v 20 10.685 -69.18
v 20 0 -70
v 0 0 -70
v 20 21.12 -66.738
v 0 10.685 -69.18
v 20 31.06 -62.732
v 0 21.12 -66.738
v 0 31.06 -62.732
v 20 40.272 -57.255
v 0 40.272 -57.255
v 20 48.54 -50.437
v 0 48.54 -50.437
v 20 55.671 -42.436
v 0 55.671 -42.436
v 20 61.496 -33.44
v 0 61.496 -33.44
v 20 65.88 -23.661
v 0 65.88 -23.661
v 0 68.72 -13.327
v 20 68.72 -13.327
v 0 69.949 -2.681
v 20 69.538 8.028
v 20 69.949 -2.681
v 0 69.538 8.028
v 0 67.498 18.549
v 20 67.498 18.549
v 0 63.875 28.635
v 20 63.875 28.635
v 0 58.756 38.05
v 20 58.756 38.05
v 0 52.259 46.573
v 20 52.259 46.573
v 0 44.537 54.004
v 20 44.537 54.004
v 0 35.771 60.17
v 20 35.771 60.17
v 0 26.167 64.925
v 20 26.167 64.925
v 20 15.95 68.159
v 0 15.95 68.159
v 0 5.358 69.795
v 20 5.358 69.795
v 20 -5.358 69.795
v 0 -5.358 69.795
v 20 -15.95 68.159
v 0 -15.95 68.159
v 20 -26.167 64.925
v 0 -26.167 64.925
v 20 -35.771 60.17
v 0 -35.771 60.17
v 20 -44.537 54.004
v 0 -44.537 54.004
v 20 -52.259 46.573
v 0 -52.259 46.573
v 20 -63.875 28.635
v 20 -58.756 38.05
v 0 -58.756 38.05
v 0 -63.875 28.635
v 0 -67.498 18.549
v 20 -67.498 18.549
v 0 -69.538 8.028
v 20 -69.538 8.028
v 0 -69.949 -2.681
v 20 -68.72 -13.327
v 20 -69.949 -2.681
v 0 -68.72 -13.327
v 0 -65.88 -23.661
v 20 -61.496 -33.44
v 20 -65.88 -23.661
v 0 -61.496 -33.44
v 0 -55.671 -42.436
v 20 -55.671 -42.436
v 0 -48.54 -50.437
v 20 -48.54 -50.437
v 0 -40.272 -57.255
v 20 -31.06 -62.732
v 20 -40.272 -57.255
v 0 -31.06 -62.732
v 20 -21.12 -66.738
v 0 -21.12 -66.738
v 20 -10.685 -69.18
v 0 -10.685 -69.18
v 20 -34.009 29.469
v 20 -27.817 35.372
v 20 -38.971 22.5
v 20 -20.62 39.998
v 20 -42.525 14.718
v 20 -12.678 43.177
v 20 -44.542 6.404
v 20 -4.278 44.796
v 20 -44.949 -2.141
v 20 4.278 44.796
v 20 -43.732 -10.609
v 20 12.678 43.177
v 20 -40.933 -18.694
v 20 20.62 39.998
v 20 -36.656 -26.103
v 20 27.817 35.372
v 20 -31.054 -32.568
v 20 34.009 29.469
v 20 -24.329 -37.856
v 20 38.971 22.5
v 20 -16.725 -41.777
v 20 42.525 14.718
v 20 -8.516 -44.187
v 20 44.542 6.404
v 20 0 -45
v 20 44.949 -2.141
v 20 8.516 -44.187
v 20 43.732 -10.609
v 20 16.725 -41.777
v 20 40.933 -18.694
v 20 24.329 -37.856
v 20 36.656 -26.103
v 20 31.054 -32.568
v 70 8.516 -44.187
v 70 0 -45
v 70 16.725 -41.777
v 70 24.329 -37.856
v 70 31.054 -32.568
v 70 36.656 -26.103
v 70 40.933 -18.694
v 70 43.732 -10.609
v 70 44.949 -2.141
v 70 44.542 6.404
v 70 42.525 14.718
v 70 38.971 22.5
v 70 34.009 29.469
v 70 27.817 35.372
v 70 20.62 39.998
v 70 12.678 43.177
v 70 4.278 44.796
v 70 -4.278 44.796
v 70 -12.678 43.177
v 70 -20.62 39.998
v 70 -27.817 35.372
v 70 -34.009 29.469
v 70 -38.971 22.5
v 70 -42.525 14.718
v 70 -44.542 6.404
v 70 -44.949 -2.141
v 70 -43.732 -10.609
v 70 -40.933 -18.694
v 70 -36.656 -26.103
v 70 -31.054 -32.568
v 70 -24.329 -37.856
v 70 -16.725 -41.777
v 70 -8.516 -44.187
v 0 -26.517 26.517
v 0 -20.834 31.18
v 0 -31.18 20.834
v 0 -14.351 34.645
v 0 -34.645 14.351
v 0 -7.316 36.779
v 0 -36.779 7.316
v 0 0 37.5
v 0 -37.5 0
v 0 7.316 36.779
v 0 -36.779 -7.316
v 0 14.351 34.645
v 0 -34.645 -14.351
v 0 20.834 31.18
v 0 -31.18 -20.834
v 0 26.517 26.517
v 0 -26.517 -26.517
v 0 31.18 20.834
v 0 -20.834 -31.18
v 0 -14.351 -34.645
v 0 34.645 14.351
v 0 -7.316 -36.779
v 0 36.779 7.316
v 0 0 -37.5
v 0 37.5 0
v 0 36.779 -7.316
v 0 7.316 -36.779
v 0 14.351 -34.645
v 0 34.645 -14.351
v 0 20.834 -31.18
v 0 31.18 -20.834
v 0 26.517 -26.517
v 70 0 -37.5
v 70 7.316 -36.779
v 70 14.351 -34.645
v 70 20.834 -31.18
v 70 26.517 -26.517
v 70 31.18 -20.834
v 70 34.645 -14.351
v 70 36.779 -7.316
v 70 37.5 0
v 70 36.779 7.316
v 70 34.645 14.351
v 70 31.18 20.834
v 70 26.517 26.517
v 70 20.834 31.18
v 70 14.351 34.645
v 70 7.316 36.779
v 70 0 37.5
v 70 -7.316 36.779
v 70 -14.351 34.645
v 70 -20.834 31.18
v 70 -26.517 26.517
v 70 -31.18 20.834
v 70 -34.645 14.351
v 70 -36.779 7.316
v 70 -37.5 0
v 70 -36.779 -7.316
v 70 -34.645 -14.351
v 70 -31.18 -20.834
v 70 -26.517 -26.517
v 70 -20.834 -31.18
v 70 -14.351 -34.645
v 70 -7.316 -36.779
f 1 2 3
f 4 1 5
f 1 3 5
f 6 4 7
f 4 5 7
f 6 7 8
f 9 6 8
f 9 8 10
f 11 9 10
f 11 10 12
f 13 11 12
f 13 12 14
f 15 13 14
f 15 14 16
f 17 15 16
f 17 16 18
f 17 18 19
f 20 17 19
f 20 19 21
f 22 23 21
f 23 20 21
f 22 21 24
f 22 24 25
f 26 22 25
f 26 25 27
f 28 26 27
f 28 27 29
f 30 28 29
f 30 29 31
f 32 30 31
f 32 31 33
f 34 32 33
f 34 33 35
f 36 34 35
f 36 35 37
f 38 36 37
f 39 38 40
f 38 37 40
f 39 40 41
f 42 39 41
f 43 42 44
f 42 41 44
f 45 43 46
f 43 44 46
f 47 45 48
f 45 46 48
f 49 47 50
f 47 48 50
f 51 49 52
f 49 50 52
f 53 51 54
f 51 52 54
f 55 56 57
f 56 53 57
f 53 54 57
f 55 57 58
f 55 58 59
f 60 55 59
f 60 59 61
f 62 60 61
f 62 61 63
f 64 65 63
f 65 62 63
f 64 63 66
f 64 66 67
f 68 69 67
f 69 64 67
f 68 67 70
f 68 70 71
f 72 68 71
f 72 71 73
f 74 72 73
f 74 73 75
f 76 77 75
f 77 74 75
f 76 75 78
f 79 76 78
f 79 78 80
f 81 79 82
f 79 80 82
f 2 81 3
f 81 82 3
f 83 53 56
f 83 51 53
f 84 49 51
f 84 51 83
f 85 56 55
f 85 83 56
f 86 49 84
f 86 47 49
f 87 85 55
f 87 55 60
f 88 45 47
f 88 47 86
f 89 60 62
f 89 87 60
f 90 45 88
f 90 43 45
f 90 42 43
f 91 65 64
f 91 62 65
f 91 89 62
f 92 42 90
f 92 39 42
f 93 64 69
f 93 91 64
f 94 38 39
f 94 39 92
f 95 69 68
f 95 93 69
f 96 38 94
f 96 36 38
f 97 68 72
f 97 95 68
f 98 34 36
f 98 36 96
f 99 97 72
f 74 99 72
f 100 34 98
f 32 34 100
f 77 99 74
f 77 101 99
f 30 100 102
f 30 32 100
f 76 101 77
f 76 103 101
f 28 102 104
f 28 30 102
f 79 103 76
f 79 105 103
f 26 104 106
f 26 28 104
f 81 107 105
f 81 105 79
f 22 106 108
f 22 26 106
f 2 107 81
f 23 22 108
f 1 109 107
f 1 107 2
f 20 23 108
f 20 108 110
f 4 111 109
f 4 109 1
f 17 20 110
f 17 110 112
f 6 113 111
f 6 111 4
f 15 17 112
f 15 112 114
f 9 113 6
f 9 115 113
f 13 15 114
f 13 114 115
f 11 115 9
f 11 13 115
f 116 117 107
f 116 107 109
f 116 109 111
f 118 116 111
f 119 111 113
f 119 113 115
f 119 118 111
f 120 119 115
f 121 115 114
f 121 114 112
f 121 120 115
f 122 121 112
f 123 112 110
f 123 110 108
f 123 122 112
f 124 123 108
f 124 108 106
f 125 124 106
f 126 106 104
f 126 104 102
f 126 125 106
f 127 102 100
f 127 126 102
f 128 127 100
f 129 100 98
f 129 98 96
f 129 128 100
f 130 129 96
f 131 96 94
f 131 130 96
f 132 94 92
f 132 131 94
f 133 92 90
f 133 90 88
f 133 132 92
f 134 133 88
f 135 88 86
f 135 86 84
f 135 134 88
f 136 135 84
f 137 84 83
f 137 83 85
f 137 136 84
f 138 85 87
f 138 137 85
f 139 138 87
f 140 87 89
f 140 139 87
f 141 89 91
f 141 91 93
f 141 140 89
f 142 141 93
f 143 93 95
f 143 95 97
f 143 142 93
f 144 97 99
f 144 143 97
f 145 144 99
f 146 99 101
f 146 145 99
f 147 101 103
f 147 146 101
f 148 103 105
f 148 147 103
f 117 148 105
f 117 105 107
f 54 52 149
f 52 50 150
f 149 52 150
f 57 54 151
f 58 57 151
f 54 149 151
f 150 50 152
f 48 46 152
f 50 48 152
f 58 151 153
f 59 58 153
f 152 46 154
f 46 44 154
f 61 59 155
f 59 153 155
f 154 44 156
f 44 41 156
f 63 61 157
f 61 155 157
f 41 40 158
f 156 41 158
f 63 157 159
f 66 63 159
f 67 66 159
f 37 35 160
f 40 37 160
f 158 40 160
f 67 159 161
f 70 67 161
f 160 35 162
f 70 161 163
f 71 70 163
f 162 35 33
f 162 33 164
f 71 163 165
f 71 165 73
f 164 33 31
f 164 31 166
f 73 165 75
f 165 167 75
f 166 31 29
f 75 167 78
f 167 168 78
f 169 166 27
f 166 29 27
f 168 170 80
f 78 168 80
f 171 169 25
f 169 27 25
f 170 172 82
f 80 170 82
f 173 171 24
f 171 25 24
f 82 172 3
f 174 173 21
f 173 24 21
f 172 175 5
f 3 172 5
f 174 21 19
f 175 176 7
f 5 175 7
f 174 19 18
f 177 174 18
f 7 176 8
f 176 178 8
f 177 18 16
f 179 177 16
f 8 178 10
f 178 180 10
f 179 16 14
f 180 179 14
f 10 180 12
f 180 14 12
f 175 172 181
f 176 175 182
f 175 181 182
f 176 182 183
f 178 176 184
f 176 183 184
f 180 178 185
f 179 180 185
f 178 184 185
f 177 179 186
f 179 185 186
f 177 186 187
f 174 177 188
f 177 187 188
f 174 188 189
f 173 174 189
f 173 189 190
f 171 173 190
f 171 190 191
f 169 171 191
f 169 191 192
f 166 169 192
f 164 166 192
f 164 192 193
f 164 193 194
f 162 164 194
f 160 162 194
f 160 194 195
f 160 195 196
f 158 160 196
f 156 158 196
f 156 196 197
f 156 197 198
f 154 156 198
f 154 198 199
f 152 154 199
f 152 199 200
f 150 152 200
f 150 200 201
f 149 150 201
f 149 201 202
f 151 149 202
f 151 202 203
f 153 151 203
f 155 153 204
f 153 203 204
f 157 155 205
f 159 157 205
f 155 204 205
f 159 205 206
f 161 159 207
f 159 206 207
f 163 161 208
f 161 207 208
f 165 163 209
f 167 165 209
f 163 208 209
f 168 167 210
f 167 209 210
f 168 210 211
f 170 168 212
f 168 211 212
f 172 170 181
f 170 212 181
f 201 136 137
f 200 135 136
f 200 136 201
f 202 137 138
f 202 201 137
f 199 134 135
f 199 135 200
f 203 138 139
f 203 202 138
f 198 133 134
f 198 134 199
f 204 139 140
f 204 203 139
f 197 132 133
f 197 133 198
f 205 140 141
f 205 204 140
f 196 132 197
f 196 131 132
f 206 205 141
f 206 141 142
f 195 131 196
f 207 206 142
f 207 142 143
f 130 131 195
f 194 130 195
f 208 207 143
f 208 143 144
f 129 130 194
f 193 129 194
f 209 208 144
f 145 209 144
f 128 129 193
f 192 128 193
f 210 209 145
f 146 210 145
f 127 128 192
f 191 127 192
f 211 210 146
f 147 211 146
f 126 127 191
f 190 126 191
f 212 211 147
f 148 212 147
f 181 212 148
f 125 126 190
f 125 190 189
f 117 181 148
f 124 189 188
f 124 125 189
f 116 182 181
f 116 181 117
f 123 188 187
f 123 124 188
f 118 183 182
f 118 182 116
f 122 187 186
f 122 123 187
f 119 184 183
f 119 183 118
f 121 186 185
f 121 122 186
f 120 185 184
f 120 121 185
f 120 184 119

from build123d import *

# Parameters (mm, degrees)
SKETCH_1_R          = 70
EXTRUDE_1_DEPTH     = 70
SKETCH_2_R          = 37.5
CUT_EXTRUDE_1_DEPTH = 122.24355653
SKETCH_3_OUTSIDE_W  = 184
SKETCH_3_OUTSIDE_H  = 184
SKETCH_3_OUTSIDE_R  = 45
CUT_EXTRUDE_2_DEPTH = 50


with BuildPart() as part:
    # 草图1 → 凸台-拉伸1 (new body)
    with BuildSketch(Plane(origin=(0, 0, 0), x_dir=(0, 0, -1), z_dir=(1, 0, 0))):
        Circle(SKETCH_1_R)
    extrude(amount=EXTRUDE_1_DEPTH)

    # 草图2 → 切除-拉伸1 (cut, through all)
    with BuildSketch(Plane(origin=(70, 0, 0), x_dir=(0, 0, -1), z_dir=(1, 0, 0))):
        Circle(SKETCH_2_R)
    extrude(amount=-CUT_EXTRUDE_1_DEPTH, mode=Mode.SUBTRACT)

    # 草图3 outside → 切除-拉伸2 (cut)
    with BuildSketch(Plane(origin=(70, 0, 0), x_dir=(0, 0, -1), z_dir=(1, 0, 0))):
        Rectangle(SKETCH_3_OUTSIDE_W, SKETCH_3_OUTSIDE_H)
        Circle(SKETCH_3_OUTSIDE_R, mode=Mode.SUBTRACT)
    extrude(amount=-CUT_EXTRUDE_2_DEPTH, mode=Mode.SUBTRACT)


solid = part.part
